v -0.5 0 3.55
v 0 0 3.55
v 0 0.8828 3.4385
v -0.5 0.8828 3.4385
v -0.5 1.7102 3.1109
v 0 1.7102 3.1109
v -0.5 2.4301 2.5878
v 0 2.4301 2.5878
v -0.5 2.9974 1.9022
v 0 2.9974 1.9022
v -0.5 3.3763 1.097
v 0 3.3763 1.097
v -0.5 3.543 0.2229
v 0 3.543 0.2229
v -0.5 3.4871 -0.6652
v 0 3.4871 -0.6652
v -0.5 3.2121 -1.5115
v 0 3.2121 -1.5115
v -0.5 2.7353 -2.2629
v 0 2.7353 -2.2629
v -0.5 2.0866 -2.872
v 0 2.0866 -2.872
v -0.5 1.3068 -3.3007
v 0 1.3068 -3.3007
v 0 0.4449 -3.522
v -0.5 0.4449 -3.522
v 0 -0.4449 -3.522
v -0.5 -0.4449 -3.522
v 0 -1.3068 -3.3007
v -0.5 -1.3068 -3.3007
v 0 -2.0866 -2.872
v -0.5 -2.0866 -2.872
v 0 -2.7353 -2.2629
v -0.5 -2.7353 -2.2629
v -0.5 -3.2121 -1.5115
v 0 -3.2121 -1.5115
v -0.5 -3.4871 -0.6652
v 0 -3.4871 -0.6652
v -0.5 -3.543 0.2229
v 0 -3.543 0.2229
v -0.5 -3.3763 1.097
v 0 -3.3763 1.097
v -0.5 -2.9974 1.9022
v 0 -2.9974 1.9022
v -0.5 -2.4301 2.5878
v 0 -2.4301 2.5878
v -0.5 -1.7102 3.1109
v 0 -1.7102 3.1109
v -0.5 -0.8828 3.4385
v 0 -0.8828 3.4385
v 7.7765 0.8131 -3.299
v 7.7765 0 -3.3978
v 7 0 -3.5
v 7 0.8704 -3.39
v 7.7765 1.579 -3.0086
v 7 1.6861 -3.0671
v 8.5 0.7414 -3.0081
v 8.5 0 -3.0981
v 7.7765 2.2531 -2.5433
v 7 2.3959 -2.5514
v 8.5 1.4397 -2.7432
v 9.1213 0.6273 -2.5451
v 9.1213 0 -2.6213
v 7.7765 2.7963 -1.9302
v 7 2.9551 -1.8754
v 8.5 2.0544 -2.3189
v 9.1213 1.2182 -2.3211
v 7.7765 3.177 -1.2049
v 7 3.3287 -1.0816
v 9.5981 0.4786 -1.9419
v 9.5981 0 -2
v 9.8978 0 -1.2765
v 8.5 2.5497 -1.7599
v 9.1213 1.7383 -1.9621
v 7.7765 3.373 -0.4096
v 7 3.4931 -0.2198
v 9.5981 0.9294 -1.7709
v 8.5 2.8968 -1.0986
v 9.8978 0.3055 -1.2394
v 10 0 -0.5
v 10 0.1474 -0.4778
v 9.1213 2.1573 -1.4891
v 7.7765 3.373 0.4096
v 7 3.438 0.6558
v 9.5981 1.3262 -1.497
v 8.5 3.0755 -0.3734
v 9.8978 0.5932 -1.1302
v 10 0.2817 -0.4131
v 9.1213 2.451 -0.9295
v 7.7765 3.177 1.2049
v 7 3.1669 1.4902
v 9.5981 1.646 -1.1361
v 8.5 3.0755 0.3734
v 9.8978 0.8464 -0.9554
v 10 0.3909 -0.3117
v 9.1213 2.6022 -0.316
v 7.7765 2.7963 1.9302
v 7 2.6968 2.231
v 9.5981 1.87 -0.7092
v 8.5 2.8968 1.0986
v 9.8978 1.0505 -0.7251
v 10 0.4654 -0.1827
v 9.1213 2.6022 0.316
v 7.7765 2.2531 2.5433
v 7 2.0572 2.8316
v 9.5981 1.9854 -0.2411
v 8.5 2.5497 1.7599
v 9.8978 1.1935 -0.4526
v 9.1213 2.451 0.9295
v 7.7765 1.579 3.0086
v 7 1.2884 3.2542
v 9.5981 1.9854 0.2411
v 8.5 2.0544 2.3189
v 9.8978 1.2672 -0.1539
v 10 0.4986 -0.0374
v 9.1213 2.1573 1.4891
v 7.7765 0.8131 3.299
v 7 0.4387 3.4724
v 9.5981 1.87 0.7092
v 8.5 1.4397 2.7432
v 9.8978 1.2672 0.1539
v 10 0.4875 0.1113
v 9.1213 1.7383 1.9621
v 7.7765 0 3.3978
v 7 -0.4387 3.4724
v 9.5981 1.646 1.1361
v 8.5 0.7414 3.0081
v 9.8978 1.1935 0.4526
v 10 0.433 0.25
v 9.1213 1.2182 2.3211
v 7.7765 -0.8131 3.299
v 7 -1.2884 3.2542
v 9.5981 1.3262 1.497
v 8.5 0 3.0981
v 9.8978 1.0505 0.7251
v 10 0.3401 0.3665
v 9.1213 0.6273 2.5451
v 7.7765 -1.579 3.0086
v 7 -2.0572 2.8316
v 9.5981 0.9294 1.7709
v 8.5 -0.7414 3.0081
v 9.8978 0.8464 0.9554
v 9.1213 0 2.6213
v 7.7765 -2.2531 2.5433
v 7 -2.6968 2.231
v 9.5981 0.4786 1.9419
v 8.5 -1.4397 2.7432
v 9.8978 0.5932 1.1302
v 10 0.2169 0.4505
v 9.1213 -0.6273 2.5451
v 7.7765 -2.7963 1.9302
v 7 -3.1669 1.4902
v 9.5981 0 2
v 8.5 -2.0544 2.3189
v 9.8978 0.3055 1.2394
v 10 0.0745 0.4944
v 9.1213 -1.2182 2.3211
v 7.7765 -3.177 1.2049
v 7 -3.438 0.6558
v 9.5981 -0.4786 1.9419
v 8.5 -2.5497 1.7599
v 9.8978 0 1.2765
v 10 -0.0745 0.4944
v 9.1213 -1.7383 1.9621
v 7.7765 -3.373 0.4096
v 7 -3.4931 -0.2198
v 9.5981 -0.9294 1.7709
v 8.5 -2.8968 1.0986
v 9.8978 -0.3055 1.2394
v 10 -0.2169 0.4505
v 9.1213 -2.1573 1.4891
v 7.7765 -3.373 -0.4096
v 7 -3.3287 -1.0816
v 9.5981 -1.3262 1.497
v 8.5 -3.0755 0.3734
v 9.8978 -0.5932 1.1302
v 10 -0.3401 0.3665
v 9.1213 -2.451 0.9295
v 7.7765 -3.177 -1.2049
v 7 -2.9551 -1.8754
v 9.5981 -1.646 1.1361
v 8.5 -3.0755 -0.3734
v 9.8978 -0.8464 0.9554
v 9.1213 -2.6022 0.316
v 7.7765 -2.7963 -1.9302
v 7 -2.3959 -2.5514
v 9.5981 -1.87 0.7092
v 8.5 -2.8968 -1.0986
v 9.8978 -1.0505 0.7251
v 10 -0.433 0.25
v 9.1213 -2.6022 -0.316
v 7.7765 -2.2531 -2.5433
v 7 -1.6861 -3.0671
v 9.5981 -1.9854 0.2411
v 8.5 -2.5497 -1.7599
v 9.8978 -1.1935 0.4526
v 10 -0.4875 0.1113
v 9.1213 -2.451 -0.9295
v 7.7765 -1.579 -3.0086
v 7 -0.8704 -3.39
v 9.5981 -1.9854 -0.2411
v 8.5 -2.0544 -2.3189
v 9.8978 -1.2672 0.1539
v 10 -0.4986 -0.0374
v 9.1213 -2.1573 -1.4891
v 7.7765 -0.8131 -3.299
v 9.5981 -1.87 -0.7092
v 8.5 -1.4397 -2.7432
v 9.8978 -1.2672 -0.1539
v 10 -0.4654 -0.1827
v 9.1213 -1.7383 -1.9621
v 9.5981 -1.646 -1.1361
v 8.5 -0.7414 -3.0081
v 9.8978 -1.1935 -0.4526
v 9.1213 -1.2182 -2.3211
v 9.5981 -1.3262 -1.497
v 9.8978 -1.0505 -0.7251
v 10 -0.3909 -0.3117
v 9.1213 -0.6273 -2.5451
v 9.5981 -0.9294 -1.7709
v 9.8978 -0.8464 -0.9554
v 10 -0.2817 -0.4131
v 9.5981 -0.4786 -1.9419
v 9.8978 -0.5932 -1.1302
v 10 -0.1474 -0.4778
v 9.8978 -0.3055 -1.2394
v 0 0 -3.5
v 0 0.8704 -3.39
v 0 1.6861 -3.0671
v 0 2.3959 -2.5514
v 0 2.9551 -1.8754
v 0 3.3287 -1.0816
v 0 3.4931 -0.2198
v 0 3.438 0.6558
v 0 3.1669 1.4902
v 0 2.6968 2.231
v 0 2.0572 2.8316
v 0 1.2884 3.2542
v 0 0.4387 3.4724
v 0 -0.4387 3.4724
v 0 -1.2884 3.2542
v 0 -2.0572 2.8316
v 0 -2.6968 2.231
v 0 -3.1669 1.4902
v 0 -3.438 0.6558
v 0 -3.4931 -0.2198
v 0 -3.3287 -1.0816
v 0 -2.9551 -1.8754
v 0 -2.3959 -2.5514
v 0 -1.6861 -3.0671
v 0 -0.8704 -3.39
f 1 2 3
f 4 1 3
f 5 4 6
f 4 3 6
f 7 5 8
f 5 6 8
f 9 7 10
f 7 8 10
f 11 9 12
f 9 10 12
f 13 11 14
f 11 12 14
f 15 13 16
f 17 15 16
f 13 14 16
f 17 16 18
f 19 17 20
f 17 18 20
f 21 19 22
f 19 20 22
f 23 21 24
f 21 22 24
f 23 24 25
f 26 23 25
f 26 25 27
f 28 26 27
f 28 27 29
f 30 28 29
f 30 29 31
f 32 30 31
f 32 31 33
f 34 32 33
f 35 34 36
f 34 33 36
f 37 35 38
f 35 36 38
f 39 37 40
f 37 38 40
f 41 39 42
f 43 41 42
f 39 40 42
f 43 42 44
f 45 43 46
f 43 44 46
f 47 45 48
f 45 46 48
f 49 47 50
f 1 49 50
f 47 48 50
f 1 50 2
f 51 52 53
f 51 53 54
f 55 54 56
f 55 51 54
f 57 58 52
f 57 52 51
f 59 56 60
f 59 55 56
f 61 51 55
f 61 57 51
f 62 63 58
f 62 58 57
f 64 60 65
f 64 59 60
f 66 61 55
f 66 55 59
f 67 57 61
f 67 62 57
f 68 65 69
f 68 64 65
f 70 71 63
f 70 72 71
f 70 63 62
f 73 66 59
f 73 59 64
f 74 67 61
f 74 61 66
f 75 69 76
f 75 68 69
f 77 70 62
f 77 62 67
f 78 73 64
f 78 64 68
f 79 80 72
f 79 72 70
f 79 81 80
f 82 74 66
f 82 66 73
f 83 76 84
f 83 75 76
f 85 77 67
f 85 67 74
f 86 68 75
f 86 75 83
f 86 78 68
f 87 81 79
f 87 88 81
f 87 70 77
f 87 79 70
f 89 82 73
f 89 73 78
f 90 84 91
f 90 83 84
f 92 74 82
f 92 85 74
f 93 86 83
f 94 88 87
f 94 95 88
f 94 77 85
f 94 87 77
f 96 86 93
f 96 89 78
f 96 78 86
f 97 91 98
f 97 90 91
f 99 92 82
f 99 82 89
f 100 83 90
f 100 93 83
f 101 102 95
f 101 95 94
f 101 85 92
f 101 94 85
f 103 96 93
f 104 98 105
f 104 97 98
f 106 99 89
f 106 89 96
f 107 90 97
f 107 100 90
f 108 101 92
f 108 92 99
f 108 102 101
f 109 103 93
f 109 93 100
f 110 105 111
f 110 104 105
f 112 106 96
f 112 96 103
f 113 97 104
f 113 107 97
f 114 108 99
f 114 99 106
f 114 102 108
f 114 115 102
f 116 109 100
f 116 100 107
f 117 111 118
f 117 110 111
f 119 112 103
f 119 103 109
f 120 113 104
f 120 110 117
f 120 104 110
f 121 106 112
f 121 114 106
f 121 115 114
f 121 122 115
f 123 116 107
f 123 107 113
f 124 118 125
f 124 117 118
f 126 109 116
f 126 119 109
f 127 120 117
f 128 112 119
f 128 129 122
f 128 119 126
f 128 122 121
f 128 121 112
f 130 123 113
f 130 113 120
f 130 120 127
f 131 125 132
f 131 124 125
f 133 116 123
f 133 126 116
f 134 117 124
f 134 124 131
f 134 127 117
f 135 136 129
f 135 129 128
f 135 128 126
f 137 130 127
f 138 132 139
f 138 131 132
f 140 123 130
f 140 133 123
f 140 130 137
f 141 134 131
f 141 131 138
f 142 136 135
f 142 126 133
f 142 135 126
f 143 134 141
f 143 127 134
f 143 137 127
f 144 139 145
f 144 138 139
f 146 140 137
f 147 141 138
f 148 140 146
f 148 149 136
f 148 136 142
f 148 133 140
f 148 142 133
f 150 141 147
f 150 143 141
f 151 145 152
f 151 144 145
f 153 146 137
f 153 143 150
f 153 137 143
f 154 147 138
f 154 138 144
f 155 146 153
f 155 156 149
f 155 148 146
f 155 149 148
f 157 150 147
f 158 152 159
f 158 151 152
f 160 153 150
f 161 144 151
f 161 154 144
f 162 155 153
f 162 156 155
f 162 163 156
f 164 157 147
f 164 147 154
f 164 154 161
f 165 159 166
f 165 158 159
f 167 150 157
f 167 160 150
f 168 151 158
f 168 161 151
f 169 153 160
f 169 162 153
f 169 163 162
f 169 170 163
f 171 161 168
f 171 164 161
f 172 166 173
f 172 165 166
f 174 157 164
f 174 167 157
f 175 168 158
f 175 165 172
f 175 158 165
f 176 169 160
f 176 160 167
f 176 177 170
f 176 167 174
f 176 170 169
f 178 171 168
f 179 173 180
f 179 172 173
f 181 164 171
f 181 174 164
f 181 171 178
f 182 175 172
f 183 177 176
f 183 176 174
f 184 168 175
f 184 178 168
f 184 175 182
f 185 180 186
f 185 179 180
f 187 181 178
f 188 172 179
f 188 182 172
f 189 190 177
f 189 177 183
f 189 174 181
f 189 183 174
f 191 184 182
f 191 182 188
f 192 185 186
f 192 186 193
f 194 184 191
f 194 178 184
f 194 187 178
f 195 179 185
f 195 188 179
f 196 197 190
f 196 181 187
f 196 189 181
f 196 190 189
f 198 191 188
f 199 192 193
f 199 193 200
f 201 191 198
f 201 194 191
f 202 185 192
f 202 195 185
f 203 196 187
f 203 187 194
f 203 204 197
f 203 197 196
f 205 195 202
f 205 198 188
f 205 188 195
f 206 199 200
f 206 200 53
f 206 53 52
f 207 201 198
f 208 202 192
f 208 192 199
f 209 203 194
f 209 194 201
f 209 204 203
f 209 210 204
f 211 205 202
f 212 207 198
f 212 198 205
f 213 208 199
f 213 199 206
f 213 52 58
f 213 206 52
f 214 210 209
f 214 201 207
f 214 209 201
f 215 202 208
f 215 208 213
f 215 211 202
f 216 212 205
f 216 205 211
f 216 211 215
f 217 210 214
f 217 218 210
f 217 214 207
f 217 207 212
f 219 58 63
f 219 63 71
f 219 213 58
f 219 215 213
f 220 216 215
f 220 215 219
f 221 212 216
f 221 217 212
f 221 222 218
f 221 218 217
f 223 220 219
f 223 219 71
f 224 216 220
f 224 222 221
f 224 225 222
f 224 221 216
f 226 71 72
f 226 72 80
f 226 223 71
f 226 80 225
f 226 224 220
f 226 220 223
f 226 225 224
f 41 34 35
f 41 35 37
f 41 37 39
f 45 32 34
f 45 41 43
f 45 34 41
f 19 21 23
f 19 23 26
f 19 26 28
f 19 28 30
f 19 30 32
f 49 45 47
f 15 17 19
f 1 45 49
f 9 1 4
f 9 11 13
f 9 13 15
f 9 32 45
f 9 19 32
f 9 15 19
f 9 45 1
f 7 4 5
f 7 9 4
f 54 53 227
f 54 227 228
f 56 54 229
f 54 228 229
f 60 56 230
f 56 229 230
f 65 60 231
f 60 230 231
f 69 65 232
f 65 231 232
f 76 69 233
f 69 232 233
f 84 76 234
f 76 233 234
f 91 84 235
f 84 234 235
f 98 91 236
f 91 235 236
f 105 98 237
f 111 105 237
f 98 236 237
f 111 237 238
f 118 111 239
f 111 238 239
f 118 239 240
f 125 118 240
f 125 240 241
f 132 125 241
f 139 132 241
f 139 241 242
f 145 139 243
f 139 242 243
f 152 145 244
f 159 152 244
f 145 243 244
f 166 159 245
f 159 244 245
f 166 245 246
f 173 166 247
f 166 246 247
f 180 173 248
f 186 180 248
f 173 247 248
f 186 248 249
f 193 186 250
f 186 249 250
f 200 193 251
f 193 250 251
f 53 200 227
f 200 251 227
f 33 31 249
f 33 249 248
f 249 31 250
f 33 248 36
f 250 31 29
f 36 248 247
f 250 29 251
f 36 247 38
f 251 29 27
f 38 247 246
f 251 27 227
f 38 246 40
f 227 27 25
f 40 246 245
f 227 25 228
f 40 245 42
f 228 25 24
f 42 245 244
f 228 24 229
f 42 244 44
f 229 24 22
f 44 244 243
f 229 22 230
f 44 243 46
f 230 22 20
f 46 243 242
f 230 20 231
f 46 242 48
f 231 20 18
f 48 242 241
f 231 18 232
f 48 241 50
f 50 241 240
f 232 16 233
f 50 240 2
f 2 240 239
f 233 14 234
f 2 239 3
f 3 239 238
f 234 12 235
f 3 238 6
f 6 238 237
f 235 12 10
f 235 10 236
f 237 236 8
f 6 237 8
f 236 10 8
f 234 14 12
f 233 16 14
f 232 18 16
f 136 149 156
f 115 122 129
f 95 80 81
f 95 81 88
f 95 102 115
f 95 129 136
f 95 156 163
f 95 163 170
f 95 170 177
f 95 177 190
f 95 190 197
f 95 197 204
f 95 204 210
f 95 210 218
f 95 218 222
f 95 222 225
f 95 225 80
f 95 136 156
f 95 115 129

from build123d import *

# Parameters (mm, degrees)
CROQUIS1_R              = 3.5
SALIENTE_EXTRUIR1_DEPTH = 10
REDONDEO1_R             = 3
CROQUIS2_R              = 3.55
SALIENTE_EXTRUIR2_DEPTH = 0.5


with BuildPart() as part:
    # Croquis1 → Saliente-Extruir1 (new body)
    with BuildSketch(Plane(origin=(0, 0, 0), x_dir=(0, 0, -1), z_dir=(1, 0, 0))):
        Circle(CROQUIS1_R)
    extrude(amount=SALIENTE_EXTRUIR1_DEPTH)

    # Redondeo1
    redondeo1_edges = [part.edges().sort_by_distance(p)[0] for p in [
        (10, 0, 3.5),
    ]]
    fillet(redondeo1_edges, radius=REDONDEO1_R)

    # Croquis2 → Saliente-Extruir2 (add)
    with BuildSketch(Plane.ZY):
        Circle(CROQUIS2_R)
    extrude(amount=SALIENTE_EXTRUIR2_DEPTH)


solid = part.part
